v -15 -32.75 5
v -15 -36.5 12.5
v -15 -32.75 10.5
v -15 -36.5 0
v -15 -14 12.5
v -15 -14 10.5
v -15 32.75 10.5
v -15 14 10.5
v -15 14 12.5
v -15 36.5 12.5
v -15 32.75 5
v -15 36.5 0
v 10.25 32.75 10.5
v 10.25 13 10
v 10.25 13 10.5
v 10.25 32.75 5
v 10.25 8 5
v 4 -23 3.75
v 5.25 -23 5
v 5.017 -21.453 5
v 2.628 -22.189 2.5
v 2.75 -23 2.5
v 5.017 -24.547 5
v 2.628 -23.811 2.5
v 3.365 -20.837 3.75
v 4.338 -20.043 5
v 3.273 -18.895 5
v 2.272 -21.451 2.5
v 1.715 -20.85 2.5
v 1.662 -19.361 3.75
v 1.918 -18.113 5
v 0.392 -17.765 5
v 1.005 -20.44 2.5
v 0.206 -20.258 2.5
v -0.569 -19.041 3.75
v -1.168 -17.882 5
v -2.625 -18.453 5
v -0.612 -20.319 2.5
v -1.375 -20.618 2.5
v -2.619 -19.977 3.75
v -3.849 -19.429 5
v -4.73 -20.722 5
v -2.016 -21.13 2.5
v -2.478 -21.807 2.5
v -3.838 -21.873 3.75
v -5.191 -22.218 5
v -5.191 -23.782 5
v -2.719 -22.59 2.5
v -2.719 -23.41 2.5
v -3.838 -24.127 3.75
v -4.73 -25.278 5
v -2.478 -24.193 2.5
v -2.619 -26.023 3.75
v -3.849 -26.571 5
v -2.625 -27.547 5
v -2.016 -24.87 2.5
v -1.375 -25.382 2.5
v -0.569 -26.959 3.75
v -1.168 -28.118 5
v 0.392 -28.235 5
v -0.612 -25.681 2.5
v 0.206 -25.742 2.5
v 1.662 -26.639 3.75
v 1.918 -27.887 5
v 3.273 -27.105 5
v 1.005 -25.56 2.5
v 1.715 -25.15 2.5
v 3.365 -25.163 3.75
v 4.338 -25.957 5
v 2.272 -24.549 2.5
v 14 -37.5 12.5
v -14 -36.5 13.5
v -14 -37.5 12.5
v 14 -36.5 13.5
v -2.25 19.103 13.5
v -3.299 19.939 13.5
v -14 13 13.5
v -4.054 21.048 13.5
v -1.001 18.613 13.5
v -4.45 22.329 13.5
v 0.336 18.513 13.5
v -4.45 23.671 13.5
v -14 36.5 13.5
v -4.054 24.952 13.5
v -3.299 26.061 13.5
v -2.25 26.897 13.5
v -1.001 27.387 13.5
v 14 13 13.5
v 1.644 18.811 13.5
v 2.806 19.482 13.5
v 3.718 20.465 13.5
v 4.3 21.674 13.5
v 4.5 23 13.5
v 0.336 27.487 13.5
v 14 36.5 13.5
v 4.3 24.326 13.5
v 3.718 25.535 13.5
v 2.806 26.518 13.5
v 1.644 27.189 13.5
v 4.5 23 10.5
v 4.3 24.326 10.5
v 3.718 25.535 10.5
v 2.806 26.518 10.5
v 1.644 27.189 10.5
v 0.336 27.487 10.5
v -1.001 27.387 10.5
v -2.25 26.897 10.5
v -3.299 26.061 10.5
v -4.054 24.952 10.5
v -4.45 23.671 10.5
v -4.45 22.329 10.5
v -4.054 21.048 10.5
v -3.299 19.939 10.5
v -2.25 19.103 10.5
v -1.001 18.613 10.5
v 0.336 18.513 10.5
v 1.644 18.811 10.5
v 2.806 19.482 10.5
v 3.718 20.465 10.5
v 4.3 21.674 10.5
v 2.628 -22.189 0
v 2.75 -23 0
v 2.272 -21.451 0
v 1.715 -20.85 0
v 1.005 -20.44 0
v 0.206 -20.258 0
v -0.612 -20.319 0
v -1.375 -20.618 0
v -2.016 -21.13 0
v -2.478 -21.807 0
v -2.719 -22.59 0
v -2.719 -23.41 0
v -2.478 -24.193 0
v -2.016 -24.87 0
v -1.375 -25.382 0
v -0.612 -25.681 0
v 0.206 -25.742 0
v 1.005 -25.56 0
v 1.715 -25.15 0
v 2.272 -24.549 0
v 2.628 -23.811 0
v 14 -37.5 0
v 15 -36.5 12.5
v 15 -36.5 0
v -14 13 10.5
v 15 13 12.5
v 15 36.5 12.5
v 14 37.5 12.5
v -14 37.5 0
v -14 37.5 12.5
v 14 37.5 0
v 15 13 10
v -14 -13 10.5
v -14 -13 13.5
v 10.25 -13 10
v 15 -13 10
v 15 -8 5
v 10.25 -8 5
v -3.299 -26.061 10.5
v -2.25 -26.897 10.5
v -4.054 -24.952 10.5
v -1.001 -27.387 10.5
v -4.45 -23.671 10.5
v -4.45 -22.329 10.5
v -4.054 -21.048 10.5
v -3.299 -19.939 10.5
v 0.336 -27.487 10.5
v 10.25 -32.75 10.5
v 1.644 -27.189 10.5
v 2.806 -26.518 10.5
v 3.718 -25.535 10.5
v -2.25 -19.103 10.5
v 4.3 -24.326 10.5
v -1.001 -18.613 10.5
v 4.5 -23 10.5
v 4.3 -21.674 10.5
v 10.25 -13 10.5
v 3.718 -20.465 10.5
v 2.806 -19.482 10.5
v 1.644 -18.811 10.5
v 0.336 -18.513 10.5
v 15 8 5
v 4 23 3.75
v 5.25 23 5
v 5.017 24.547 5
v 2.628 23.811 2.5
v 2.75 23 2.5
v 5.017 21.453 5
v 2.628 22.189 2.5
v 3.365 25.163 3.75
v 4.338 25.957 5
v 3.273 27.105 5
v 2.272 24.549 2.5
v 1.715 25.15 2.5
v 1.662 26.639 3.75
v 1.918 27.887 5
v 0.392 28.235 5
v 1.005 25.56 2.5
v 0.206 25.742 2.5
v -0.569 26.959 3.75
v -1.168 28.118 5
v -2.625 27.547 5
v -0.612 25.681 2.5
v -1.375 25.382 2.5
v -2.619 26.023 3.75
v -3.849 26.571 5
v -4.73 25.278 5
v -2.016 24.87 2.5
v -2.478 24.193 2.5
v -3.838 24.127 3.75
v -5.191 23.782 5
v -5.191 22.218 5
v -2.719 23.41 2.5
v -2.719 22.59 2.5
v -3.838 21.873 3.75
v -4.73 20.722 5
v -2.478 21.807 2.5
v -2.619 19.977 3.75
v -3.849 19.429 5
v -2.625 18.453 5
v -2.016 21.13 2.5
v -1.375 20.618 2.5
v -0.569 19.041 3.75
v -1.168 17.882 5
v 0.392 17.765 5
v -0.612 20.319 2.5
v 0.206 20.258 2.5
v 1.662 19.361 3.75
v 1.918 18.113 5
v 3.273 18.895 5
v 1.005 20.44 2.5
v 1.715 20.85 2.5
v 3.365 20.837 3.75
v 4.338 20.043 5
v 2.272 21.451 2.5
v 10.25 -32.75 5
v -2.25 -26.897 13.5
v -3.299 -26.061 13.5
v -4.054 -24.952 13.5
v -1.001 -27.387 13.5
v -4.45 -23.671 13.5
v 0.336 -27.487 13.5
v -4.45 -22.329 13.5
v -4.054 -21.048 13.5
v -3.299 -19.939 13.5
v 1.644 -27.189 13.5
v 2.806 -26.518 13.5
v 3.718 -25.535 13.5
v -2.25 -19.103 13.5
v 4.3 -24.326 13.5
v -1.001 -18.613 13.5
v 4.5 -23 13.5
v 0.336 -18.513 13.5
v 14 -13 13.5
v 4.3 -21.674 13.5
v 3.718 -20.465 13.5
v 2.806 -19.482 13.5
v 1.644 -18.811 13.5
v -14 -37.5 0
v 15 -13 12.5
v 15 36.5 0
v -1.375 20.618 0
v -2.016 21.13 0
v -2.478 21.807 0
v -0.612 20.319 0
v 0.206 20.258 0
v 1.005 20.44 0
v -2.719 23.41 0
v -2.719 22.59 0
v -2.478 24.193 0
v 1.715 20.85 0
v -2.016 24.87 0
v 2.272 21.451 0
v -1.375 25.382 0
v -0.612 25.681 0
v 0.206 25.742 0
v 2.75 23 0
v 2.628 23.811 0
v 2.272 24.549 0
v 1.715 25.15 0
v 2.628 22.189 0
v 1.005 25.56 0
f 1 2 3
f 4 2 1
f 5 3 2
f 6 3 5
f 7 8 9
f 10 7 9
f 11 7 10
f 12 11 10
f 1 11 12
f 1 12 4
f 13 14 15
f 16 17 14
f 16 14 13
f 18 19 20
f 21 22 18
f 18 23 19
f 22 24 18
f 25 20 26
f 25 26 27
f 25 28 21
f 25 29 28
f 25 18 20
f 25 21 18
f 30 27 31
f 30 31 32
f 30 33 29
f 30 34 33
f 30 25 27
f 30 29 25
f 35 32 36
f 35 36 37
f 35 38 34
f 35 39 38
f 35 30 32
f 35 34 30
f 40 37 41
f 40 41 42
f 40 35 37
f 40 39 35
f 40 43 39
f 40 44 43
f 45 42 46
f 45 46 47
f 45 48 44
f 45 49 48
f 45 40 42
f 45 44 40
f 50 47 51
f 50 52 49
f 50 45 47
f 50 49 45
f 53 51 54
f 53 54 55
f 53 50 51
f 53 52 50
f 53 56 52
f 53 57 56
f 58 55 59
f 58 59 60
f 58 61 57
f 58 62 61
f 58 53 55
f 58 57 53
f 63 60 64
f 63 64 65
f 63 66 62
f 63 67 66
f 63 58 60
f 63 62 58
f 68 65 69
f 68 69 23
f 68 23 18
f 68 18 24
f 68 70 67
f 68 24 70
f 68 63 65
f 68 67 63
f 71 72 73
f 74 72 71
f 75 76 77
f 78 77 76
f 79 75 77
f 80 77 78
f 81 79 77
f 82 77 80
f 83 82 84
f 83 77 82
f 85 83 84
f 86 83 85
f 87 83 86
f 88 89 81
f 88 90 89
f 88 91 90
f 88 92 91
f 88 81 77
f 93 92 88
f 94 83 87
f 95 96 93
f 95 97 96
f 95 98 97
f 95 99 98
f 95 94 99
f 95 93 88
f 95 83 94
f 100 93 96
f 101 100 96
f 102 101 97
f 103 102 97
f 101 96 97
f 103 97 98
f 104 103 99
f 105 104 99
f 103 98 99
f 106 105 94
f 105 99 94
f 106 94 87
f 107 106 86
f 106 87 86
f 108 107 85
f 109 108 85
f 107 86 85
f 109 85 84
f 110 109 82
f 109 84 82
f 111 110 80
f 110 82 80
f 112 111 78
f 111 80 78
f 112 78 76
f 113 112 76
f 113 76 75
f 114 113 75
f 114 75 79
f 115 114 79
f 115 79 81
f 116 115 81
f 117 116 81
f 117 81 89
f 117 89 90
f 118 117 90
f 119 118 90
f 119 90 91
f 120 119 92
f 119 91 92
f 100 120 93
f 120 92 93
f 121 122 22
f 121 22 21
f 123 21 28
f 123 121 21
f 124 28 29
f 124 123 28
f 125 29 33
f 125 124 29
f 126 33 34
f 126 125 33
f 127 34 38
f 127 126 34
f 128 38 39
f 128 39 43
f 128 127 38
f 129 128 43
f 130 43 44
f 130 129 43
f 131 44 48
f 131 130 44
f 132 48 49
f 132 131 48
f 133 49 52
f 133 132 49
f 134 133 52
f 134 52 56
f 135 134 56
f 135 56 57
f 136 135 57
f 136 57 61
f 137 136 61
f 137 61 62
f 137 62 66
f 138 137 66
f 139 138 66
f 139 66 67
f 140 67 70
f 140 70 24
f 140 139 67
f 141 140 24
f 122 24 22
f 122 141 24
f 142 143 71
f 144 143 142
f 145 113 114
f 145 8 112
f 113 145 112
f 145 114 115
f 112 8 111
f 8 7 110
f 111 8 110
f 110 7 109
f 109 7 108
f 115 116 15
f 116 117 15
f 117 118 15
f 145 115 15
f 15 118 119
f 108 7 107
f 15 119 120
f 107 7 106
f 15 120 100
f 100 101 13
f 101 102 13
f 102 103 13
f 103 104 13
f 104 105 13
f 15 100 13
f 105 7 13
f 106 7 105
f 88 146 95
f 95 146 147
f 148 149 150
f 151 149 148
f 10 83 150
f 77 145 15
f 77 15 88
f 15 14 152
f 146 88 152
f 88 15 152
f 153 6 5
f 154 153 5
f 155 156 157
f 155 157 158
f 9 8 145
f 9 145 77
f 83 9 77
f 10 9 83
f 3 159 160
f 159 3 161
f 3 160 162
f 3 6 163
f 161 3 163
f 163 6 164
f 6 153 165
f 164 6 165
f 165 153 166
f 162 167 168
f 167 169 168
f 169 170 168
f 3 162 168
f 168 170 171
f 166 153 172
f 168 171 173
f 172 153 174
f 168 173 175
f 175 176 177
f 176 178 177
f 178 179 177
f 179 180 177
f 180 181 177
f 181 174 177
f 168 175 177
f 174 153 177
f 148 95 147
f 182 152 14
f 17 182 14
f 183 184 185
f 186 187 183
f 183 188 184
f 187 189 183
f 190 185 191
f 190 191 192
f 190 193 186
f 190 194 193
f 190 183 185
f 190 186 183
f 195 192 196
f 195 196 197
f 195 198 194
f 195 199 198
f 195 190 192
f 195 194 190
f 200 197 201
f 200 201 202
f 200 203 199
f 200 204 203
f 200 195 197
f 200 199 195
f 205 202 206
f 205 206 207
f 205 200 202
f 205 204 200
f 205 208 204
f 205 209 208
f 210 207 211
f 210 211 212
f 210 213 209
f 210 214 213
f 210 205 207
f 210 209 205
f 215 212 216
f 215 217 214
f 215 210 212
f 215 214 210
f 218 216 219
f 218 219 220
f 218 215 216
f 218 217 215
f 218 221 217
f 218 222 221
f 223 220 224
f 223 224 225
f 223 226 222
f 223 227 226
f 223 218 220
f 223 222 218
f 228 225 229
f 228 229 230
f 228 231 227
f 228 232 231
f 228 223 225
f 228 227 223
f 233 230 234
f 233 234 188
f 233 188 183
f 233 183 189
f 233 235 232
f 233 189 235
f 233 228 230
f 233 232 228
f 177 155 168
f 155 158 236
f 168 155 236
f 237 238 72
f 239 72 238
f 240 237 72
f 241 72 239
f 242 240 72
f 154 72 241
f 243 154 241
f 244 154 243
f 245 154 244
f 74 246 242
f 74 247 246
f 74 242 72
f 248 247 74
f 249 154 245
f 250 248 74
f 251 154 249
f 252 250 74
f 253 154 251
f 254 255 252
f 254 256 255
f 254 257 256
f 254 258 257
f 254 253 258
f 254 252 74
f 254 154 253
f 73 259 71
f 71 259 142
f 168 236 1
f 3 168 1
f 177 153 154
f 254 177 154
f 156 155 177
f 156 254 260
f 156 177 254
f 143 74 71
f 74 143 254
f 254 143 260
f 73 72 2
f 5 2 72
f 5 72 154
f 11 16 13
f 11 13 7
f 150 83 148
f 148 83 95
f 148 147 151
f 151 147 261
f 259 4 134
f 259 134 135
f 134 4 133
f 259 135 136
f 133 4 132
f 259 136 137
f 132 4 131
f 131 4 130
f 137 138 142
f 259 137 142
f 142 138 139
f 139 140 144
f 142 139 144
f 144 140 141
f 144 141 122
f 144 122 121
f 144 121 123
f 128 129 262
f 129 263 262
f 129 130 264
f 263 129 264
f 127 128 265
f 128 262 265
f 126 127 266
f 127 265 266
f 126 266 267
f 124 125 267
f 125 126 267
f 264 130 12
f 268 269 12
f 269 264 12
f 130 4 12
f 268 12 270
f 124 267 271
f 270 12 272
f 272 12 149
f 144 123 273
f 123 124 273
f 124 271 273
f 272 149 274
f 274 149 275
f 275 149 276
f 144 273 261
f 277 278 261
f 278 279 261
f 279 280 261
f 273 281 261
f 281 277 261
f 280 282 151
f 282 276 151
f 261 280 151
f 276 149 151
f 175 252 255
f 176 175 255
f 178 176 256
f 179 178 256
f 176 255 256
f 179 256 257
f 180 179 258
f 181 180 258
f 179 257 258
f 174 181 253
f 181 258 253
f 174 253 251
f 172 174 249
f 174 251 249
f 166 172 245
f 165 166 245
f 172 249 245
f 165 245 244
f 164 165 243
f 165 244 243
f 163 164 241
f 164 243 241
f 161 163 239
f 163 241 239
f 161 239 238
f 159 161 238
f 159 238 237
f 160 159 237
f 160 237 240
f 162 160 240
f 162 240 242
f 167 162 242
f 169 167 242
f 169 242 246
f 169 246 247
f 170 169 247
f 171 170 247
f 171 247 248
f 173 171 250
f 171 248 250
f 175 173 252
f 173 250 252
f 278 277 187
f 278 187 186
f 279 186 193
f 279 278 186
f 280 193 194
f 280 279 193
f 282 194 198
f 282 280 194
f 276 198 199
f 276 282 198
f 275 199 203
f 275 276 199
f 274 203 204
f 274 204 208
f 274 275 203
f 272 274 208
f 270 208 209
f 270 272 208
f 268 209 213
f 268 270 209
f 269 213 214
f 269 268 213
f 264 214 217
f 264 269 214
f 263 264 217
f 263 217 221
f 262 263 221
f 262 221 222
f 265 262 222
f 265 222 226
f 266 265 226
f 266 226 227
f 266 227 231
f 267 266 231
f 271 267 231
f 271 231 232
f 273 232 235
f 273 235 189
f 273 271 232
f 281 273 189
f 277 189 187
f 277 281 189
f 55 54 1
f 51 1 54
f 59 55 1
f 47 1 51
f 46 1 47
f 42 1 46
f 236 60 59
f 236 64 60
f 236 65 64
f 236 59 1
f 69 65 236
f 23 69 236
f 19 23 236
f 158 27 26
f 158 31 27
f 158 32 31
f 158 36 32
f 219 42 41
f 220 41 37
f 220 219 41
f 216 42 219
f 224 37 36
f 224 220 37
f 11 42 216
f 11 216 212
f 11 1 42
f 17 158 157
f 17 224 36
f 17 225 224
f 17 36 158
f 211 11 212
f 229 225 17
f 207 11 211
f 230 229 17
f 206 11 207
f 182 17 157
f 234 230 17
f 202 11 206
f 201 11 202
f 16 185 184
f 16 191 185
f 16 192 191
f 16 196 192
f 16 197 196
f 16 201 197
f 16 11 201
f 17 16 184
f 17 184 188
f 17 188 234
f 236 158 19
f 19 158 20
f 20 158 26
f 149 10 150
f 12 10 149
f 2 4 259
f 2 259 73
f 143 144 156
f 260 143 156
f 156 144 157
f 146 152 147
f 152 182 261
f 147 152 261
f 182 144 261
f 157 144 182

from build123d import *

# Parameters (mm, degrees)
SKETCH001_W     = 30
SKETCH001_H     = 75
SKETCH001_R     = 2.75
PAD_DEPTH       = 5
PAD001_DEPTH    = 5.5
SKETCH003_W     = 30
SKETCH003_H     = 24.5
PAD002_DEPTH    = 3
CHAMFER_SIZE    = 2.5
SKETCH004_R     = 4.5
POCKET_DEPTH    = 3
CHAMFER001_SIZE = 5
CHAMFER002_SIZE = 1


with BuildPart() as part:
    # Sketch001 → Pad (new body)
    with BuildSketch(Plane.XY):
        Rectangle(SKETCH001_W, SKETCH001_H)
        with Locations((0, 23)):
            Circle(SKETCH001_R, mode=Mode.SUBTRACT)
        with Locations((0, -23)):
            Circle(SKETCH001_R, mode=Mode.SUBTRACT)
    extrude(amount=PAD_DEPTH)

    # Sketch002 (on Face8 of Pad) → Pad001 (join)
    with BuildSketch(Plane.XY.offset(5)):
        Polygon((-15, 37.5), (15, 37.5), (15, 13), (10.25, 13), (10.25, 32.75), (-15, 32.75), align=None)
        Polygon((-15, -37.5), (15, -37.5), (15, -13), (10.25, -13), (10.25, -32.75), (-15, -32.75), align=None)
    extrude(amount=PAD001_DEPTH)

    # Sketch003 (on Face10 of Pad001) → Pad002 (join)
    with BuildSketch(Plane.XY.offset(10.5)):
        with Locations((0, 25.25)):
            Rectangle(SKETCH003_W, SKETCH003_H)
        with Locations((0, -25.25)):
            Rectangle(SKETCH003_W, SKETCH003_H)
    extrude(amount=PAD002_DEPTH)

    # Chamfer
    chamfer_edges = [part.edges().sort_by_distance(p)[0] for p in [
        (-2.75, -23, 5),
        (-2.75, 23, 5),
    ]]
    chamfer(chamfer_edges, length=CHAMFER_SIZE)

    # Sketch004 (on Face18 of Chamfer) → Pocket (cut)
    with BuildSketch(Plane.XY.offset(13.5)):
        with Locations((0, 23)):
            Circle(SKETCH004_R)
        with Locations((0, -23)):
            Circle(SKETCH004_R)
    extrude(amount=-POCKET_DEPTH, mode=Mode.SUBTRACT)

    # Chamfer001
    chamfer001_edges = [part.edges().sort_by_distance(p)[0] for p in [
        (12.625, 13, 5),
        (12.625, -13, 5),
    ]]
    chamfer(chamfer001_edges, length=CHAMFER001_SIZE)

    # Chamfer002
    chamfer002_edges = [part.edges().sort_by_distance(p)[0] for p in [
        (15, 25.25, 13.5),
        (0, 37.5, 13.5),
        (15, -25.25, 13.5),
        (0, -37.5, 13.5),
        (-15, 25.25, 13.5),
        (-15, -25.25, 13.5),
        (-15, 13, 12),
        (-15, -13, 12),
        (-15, -37.5, 6.75),
        (-15, 37.5, 6.75),
        (15, -37.5, 6.75),
        (15, 37.5, 6.75),
    ]]
    chamfer(chamfer002_edges, length=CHAMFER002_SIZE)


solid = part.part
